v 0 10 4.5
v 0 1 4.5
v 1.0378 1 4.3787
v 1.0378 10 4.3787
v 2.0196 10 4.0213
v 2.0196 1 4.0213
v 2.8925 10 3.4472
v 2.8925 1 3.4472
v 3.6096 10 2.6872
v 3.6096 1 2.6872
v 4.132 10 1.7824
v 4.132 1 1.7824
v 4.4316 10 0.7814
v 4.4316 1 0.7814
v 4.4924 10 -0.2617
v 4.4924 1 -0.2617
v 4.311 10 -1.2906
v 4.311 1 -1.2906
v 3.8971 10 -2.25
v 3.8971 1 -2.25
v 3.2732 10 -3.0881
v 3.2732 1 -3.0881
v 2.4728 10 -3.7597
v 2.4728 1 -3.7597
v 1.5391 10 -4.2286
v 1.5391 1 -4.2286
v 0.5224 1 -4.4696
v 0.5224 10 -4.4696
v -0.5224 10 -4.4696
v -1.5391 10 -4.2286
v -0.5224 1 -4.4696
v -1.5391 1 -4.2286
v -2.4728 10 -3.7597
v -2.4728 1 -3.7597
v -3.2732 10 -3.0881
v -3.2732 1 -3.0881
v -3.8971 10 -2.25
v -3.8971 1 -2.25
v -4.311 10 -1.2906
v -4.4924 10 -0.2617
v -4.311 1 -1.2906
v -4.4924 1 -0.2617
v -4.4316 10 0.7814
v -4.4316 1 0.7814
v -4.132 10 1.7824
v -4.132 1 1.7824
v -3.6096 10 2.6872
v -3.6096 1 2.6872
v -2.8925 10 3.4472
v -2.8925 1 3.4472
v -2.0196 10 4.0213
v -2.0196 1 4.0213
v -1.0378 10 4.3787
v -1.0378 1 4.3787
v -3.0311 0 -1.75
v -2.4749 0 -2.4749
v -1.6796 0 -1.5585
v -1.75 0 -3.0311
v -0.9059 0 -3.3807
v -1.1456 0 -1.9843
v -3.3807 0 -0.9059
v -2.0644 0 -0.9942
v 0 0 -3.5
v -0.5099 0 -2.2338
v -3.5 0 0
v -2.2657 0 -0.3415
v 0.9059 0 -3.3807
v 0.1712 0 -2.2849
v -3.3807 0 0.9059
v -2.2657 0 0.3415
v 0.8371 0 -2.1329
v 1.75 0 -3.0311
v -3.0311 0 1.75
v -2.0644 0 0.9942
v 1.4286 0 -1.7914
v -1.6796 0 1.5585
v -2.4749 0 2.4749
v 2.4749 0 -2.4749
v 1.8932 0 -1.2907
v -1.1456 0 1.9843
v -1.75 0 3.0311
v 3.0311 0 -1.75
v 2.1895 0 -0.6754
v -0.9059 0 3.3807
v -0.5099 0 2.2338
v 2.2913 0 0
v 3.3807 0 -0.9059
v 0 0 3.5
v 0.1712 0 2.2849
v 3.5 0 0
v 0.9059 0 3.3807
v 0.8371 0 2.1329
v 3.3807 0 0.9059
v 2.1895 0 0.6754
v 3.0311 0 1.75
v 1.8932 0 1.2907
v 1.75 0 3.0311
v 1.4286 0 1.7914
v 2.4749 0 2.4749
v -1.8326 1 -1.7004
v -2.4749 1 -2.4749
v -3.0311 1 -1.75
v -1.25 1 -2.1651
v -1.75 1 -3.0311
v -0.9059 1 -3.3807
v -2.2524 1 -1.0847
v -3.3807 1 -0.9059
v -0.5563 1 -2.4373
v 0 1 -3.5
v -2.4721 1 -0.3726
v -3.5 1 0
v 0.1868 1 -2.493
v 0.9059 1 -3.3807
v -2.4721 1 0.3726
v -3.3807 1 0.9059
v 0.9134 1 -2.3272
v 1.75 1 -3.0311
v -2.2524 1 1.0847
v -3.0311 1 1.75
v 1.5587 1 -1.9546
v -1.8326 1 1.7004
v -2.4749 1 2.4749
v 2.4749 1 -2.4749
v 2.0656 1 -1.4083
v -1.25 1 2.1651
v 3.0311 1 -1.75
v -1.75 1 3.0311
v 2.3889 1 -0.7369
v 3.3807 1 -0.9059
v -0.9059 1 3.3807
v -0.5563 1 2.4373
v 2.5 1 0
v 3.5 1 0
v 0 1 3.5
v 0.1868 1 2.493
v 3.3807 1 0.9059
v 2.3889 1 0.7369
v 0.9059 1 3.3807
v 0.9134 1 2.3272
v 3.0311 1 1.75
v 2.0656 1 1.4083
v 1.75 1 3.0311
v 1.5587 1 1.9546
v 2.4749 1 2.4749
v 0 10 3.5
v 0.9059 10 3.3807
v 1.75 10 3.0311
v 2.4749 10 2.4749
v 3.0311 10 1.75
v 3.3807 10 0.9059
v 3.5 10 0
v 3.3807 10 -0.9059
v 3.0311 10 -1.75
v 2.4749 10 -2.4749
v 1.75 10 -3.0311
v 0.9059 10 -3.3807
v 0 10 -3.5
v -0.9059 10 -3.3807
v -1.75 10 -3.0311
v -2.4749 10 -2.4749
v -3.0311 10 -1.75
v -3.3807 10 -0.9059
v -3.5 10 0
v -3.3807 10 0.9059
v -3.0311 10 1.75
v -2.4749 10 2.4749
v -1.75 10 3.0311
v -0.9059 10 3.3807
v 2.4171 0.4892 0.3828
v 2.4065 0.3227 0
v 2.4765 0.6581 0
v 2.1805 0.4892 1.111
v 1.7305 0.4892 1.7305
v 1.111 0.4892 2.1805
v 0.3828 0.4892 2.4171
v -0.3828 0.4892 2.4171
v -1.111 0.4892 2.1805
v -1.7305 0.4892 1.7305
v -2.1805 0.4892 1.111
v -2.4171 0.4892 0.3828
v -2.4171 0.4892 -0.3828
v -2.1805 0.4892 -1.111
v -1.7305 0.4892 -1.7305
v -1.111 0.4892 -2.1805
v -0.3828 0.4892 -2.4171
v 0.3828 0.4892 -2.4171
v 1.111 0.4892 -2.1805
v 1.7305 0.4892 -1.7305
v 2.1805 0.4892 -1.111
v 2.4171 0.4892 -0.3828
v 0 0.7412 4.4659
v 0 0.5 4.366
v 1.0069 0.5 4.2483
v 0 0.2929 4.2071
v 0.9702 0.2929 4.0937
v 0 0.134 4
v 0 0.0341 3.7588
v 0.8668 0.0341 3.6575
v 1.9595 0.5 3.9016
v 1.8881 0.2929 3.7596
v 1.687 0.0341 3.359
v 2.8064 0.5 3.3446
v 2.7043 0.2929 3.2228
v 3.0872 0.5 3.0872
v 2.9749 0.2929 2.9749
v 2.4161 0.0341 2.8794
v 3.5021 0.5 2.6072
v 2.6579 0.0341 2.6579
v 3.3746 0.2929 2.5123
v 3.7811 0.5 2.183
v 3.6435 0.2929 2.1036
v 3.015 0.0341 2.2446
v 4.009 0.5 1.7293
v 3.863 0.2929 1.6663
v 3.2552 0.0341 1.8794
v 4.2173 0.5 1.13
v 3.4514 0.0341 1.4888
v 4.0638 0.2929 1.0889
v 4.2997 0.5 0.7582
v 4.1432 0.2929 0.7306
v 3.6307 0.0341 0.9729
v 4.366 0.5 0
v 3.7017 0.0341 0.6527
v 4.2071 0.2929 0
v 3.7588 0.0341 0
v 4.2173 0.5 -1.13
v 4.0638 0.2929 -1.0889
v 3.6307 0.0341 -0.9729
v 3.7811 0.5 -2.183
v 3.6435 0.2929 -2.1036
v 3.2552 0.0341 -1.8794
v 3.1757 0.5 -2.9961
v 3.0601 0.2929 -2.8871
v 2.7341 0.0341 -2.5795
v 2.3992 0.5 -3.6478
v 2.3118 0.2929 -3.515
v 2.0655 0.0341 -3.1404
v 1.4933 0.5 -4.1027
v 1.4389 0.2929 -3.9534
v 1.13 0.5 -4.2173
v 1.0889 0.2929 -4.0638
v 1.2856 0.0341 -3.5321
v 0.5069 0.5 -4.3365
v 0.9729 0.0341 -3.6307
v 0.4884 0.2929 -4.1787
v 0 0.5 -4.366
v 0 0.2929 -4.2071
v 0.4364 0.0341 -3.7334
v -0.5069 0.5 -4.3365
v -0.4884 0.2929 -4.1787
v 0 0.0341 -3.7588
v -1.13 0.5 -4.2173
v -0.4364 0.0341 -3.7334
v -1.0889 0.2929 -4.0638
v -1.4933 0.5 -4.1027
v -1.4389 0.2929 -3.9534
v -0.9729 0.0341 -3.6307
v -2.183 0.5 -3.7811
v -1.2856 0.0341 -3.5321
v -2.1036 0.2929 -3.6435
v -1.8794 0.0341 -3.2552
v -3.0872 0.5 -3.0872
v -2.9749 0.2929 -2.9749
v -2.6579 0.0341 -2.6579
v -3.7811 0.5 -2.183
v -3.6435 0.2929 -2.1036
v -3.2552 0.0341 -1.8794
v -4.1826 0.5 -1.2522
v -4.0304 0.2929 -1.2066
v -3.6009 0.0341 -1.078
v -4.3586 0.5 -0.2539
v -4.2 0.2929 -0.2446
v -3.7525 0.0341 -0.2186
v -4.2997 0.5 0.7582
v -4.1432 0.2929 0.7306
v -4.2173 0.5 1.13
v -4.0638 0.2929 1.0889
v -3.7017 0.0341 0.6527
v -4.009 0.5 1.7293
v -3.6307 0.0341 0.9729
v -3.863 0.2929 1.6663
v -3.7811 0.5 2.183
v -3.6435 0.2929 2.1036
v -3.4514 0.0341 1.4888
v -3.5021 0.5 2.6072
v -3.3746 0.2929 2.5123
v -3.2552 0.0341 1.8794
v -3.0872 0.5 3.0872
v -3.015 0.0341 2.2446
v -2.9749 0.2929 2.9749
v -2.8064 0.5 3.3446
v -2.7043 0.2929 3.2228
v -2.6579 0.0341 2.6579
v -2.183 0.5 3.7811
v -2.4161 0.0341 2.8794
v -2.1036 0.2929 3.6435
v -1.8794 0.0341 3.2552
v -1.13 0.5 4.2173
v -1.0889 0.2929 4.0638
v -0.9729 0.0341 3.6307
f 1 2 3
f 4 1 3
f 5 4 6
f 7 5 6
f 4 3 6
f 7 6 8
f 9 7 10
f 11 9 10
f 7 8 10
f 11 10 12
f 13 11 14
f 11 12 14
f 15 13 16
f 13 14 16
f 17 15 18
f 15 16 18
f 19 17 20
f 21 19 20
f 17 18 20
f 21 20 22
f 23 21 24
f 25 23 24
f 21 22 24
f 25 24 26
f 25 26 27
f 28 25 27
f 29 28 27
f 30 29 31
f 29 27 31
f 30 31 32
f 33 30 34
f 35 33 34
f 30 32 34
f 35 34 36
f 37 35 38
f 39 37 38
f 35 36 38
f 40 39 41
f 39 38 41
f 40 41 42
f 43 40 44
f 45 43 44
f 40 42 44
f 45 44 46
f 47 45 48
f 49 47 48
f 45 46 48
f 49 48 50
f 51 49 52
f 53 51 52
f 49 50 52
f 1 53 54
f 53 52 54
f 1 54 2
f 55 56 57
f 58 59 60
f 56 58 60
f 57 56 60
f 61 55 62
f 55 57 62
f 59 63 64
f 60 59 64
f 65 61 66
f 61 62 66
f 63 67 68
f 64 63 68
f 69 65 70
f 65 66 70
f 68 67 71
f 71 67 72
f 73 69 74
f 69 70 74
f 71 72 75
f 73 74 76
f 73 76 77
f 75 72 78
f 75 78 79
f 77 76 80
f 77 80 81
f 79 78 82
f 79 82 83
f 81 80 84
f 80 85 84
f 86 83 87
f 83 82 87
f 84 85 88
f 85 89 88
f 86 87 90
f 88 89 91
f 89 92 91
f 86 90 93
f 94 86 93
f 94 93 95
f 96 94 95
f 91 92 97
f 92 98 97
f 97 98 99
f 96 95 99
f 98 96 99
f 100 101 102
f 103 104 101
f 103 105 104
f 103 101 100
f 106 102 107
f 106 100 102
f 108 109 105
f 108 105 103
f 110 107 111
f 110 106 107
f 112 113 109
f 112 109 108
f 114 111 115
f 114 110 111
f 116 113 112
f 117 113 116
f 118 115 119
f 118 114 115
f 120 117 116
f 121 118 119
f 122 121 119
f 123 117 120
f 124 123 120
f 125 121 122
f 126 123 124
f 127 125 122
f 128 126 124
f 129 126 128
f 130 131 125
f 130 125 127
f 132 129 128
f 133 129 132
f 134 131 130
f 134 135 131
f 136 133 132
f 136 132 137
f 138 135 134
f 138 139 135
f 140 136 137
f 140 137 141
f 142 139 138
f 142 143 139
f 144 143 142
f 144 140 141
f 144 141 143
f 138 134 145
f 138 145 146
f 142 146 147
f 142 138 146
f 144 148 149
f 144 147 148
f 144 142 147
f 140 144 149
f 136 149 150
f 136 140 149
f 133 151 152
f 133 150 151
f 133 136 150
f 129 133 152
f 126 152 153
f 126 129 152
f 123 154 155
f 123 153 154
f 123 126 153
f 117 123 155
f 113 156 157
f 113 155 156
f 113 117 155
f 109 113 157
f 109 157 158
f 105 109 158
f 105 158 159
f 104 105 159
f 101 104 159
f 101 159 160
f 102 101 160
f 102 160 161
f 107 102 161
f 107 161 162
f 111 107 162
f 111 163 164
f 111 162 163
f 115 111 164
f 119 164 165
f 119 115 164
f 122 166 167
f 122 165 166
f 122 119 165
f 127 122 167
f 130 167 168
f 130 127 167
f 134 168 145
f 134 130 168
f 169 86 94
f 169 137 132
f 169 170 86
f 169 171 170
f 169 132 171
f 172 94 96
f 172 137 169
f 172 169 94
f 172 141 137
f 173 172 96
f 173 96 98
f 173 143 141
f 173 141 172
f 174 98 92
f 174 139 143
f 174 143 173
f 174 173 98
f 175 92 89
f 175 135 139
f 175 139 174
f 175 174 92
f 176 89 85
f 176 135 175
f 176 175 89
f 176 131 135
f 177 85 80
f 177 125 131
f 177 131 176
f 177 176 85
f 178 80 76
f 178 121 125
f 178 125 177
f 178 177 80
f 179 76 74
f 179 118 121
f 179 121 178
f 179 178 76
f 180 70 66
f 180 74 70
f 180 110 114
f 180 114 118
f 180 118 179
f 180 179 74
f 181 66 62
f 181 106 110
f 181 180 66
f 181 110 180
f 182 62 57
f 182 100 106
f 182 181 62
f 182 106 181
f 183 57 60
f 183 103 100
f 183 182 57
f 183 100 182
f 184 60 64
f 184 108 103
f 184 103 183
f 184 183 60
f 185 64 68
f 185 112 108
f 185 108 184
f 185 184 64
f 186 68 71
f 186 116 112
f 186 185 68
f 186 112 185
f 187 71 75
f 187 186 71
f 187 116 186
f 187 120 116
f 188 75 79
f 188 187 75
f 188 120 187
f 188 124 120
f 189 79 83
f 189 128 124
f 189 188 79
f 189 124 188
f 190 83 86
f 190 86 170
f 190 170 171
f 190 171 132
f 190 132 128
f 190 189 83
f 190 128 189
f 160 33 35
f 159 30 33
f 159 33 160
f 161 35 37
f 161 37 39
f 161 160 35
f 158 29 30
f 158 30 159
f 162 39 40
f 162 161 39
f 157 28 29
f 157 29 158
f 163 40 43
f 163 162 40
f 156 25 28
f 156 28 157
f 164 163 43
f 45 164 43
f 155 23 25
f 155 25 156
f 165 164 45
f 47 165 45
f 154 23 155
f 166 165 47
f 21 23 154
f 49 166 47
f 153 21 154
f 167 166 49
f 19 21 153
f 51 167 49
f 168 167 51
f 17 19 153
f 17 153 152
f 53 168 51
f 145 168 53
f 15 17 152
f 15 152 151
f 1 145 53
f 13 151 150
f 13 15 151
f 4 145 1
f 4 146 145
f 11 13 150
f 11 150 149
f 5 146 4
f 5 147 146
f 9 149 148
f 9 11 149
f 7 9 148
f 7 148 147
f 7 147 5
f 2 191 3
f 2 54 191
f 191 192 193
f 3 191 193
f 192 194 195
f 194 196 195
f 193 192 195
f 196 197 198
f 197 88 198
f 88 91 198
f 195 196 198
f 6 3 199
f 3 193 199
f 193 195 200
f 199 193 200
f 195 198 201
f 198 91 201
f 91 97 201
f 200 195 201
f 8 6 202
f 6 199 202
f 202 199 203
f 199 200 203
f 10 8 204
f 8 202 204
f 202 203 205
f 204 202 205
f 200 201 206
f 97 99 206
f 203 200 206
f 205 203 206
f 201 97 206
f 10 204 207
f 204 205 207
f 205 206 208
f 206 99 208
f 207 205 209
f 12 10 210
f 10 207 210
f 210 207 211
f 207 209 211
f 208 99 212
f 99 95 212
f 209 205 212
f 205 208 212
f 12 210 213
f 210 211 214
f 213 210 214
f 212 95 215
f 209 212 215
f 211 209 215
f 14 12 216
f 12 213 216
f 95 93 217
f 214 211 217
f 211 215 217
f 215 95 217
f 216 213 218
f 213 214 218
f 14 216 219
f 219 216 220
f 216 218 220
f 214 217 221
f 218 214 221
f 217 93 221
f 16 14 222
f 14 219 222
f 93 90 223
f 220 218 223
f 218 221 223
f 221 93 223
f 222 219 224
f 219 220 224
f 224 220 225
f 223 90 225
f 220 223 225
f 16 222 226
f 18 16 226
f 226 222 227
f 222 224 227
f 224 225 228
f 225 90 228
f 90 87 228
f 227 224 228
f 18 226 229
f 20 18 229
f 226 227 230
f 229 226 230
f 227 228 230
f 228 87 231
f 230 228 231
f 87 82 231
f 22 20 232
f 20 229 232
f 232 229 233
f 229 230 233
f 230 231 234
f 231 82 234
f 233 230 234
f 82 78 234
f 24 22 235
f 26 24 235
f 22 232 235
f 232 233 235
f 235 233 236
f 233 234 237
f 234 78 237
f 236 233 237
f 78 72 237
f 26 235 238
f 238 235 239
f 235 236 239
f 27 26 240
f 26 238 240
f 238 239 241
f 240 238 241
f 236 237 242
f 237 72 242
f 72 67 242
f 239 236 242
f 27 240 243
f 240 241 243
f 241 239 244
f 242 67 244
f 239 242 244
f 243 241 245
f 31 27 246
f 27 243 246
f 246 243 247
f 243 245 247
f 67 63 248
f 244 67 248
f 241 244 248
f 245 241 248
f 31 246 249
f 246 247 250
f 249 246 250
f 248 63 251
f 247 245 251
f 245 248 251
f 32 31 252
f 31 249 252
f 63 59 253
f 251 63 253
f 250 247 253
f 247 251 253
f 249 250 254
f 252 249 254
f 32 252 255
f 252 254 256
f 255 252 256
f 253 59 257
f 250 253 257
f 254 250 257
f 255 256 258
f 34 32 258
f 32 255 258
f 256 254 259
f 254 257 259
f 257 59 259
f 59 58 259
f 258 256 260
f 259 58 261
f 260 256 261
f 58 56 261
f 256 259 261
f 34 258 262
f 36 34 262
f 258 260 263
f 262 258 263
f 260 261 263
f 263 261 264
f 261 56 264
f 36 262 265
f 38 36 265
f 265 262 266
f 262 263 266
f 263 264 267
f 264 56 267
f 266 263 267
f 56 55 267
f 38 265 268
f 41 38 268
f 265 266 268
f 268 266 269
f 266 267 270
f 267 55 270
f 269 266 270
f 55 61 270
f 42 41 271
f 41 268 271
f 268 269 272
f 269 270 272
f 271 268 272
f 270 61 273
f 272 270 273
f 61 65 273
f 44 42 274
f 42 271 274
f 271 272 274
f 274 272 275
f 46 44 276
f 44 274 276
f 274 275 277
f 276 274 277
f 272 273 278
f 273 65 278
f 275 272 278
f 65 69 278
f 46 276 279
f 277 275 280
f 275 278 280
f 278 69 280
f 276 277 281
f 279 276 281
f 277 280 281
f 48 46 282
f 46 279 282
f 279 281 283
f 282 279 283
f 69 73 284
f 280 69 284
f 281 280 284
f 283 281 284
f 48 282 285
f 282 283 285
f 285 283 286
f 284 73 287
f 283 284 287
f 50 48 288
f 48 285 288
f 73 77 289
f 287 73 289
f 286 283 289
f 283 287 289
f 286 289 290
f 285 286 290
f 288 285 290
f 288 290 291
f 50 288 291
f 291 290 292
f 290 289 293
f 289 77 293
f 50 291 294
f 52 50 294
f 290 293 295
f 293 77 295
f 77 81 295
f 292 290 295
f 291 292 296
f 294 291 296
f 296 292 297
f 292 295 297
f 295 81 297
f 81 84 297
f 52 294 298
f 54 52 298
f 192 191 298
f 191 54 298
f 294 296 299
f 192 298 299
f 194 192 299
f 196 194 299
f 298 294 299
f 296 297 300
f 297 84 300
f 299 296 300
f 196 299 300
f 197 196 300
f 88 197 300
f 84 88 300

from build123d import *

# Parameters (mm, degrees)
SKETCH1_R           = 4.5
BOSS_EXTRUDE1_DEPTH = 10
SHELL1_T            = -1
FILLET1_R           = 1


with BuildPart() as part:
    # Sketch1 → Boss-Extrude1 (new body)
    with BuildSketch(Plane(origin=(0, 0, 0), x_dir=(1, 0, 0), z_dir=(0, 1, 0))):
        with Locations(Location((0, 0, 0), (0, 0, 270))):
            Circle(SKETCH1_R)
    extrude(amount=BOSS_EXTRUDE1_DEPTH)

    # Shell1
    shell1_openings = [part.faces().sort_by_distance(p)[0] for p in [
        (0, 10, 0),
    ]]
    offset(amount=SHELL1_T, openings=shell1_openings, kind=Kind.INTERSECTION)

    # Sketch4 → Cut-Revolve1 (revolve, cut)
    with BuildSketch(Plane.XY):
        with BuildLine():
            Line((0, 3.5), (0, -1.5))
            ThreePointArc((0, -1.5), (2.5, 1), (0, 3.5))
        make_face()
    revolve(axis=Axis((0, 3.5, 0), (0, -1, 0)), mode=Mode.SUBTRACT)

    # Fillet1
    fillet1_edges = [part.edges().sort_by_distance(p)[0] for p in [
        (0, 0, -4.5),
    ]]
    fillet(fillet1_edges, radius=FILLET1_R)


solid = part.part
